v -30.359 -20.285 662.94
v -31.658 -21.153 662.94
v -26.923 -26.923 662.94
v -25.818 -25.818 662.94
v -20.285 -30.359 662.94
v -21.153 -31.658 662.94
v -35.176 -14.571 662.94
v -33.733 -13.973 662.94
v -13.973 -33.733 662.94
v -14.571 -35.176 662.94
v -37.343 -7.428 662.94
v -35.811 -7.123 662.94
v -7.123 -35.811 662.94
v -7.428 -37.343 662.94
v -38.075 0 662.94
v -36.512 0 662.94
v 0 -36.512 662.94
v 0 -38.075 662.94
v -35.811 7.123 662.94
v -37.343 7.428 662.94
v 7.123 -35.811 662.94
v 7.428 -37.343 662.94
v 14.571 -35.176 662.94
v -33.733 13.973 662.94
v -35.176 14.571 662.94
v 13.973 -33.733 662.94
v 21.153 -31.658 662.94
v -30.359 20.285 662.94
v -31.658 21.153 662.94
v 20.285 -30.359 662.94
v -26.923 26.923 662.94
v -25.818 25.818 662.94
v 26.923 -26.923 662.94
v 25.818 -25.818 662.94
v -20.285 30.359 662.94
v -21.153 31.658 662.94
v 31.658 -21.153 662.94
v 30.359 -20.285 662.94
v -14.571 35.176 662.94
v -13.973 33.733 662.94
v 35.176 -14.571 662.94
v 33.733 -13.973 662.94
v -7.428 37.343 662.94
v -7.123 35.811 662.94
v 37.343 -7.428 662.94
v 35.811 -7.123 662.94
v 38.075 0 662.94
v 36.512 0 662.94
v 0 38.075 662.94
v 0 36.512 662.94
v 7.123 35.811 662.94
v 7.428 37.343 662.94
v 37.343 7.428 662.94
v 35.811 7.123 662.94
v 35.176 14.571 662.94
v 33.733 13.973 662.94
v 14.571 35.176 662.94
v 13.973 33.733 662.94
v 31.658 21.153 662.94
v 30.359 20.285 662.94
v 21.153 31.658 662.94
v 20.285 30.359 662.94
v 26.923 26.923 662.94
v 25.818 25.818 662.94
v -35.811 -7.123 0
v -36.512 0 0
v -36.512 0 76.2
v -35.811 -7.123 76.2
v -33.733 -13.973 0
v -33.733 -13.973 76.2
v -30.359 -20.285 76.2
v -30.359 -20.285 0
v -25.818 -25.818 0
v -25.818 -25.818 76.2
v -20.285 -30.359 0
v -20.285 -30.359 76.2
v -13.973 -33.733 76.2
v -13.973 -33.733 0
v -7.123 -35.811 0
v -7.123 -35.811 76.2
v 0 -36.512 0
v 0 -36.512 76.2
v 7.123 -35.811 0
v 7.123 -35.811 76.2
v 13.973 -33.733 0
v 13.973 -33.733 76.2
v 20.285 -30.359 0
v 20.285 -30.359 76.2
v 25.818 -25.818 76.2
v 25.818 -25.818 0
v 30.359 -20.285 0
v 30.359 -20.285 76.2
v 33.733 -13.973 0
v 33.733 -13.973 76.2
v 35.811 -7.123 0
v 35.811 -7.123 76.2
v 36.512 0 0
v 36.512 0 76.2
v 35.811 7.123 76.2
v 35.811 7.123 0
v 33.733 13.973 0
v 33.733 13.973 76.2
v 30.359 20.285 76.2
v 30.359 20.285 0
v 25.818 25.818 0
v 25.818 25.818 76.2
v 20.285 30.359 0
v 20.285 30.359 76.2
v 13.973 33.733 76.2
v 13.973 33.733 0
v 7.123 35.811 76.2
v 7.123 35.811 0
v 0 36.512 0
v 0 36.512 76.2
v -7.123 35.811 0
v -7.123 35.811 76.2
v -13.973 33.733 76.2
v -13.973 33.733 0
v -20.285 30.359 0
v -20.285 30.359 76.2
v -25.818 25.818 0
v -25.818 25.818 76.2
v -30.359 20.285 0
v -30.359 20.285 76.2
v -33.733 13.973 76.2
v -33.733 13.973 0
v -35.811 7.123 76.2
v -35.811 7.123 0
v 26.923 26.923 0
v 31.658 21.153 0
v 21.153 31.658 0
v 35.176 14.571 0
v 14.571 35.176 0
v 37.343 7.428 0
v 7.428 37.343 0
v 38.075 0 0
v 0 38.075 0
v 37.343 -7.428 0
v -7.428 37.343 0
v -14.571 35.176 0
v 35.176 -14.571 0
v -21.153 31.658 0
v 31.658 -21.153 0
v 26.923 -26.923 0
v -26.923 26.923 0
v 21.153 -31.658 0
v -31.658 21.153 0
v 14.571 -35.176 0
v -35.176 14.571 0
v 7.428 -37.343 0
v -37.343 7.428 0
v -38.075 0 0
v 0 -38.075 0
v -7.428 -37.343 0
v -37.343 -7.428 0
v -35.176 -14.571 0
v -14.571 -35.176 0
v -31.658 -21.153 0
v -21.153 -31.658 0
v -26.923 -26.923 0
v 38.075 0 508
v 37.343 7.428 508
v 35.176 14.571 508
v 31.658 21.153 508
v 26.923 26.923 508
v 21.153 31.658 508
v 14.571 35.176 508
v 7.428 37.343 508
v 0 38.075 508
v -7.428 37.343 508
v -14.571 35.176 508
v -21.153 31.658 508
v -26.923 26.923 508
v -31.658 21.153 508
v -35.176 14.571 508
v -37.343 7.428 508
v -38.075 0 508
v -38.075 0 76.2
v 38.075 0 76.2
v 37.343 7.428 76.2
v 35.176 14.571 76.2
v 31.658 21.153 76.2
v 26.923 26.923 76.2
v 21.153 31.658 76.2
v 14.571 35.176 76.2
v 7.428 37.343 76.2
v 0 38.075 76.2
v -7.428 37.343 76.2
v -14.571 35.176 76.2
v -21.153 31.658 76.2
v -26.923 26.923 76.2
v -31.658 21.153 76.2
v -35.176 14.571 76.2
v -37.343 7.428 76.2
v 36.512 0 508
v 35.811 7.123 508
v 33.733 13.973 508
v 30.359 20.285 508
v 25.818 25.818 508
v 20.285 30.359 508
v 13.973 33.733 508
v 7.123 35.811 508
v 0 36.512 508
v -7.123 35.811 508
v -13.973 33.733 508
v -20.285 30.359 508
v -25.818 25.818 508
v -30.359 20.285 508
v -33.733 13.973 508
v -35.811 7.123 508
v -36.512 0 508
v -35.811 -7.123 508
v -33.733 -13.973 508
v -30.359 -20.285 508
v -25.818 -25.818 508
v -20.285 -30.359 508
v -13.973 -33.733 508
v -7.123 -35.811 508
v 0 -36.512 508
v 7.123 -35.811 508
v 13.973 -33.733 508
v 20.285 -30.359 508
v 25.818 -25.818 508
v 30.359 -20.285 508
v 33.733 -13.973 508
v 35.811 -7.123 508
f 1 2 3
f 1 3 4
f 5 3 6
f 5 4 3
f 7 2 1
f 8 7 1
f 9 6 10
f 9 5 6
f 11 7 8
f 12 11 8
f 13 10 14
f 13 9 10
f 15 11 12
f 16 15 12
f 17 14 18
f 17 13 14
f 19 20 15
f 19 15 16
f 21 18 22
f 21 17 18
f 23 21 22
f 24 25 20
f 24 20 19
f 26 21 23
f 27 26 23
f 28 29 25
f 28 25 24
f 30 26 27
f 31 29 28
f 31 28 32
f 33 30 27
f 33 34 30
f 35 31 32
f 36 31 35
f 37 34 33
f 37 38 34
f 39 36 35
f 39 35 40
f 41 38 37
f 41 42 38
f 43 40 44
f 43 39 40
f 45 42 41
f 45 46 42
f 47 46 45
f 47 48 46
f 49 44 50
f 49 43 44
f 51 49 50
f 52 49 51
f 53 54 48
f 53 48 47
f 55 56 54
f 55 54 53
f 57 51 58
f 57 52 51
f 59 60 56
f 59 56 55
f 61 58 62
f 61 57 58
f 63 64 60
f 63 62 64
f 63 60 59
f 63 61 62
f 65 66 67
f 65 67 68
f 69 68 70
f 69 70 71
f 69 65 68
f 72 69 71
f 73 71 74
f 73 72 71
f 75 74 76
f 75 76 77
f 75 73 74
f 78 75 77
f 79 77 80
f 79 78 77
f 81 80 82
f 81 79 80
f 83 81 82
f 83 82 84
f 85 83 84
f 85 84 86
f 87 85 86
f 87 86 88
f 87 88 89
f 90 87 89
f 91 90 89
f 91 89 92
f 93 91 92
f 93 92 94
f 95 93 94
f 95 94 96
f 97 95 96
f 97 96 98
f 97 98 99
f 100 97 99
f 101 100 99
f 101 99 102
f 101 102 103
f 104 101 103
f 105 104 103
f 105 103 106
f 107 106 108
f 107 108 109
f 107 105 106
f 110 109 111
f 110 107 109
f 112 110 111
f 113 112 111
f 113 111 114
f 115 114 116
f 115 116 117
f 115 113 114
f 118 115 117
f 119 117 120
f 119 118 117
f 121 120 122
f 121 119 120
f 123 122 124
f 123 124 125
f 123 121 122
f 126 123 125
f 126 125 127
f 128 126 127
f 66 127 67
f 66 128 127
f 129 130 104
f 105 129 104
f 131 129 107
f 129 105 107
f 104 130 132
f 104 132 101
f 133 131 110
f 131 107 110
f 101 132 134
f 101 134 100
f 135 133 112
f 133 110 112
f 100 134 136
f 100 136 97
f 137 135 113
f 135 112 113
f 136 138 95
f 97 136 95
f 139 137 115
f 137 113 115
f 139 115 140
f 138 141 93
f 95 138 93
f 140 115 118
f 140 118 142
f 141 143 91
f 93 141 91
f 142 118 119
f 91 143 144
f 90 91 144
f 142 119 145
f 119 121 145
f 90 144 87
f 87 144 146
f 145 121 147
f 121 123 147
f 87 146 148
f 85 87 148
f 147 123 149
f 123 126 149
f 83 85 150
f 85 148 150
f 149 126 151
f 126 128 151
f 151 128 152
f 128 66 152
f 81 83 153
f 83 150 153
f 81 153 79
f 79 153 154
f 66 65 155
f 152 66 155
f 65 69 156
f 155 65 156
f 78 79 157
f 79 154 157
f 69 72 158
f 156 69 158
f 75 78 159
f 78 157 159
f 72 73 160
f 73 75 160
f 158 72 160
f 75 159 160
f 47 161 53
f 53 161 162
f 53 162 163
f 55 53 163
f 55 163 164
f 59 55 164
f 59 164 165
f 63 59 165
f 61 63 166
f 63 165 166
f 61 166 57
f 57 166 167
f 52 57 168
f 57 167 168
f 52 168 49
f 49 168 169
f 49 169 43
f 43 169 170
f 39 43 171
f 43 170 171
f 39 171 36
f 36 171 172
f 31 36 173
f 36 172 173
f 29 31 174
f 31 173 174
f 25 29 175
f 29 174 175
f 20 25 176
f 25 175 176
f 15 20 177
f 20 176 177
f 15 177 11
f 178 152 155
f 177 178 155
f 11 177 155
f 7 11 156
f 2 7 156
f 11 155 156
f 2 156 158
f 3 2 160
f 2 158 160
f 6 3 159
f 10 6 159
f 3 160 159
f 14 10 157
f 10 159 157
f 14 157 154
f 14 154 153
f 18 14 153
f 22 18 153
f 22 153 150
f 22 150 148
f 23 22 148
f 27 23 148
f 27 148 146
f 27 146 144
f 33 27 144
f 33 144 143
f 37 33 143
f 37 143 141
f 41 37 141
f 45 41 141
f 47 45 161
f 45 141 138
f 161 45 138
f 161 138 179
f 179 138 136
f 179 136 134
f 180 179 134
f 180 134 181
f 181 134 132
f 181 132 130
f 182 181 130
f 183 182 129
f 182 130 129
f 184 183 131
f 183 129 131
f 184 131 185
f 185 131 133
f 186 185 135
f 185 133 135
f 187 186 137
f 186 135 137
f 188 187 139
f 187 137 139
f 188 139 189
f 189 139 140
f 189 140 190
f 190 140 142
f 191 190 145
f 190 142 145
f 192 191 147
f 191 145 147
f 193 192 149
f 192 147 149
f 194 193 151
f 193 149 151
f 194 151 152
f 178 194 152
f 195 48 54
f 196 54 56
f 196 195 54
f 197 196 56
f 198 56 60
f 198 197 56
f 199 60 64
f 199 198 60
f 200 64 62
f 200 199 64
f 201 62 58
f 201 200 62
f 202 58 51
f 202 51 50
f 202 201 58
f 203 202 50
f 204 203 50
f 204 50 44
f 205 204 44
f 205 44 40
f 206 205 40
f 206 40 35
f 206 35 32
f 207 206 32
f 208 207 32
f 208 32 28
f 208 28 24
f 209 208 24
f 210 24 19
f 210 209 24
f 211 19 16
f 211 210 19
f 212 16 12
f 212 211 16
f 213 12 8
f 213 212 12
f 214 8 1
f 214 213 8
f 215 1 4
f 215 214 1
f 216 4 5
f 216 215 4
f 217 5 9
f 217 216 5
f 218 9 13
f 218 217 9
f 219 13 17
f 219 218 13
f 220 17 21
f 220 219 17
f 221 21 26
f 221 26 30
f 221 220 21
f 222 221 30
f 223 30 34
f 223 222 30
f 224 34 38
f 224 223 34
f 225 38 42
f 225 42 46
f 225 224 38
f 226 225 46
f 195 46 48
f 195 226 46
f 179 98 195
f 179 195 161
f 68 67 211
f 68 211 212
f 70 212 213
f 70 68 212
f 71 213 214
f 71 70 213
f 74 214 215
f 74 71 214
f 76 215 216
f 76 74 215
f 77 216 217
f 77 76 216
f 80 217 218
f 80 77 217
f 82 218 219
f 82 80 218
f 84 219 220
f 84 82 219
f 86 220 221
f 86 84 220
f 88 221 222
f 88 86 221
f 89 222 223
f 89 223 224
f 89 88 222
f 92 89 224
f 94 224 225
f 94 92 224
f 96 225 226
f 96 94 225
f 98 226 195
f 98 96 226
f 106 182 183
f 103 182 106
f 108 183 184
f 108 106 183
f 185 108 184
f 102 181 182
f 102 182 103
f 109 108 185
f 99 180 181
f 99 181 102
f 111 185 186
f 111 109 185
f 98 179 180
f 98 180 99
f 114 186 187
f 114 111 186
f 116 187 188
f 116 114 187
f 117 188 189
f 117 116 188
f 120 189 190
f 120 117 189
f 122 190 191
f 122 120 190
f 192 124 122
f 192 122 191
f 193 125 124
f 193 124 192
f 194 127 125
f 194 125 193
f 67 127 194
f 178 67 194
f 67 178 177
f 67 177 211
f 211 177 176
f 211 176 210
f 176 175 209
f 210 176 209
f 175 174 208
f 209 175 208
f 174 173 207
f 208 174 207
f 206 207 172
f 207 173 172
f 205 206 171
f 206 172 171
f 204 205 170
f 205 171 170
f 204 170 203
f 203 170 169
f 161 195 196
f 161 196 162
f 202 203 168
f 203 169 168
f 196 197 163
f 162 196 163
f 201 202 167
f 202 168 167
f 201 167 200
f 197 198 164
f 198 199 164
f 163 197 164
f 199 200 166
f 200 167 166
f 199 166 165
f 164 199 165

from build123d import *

# Parameters (mm, degrees)
SKETCH1_R           = 38.0746
SKETCH1_R_2         = 36.5125
BOSS_EXTRUDE1_DEPTH = 76.2
BOSS_EXTRUDE2_DEPTH = 431.8
SKETCH3_R           = 38.0746
SKETCH3_R_2         = 36.5125
BOSS_EXTRUDE3_DEPTH = 154.94


with BuildPart() as part:
    # Sketch1 → Boss-Extrude1 (new body)
    with BuildSketch(Plane.XY):
        with Locations(Location((0, 0, 0), (0, 0, 180))):
            Circle(SKETCH1_R)
        with Locations(Location((0, 0, 0), (0, 0, 180))):
            Circle(SKETCH1_R_2, mode=Mode.SUBTRACT)
    extrude(amount=BOSS_EXTRUDE1_DEPTH)

    # Sketch2 → Boss-Extrude2 (add)
    with BuildSketch(Plane.XY.offset(76.2)):
        with BuildLine():
            Line((-38.0746, 0), (-36.5125, 0))
            ThreePointArc((-36.5125, 0), (0, -36.5125), (36.5125, 0))
            Line((36.5125, 0), (38.0746, 0))
            ThreePointArc((38.0746, 0), (0, -38.0746), (-38.0746, 0))
        make_face()
    extrude(amount=BOSS_EXTRUDE2_DEPTH)

    # Sketch3 → Boss-Extrude3 (add)
    with BuildSketch(Plane.XY.offset(508)):
        Circle(SKETCH3_R)
        Circle(SKETCH3_R_2, mode=Mode.SUBTRACT)
    extrude(amount=BOSS_EXTRUDE3_DEPTH)


solid = part.part
